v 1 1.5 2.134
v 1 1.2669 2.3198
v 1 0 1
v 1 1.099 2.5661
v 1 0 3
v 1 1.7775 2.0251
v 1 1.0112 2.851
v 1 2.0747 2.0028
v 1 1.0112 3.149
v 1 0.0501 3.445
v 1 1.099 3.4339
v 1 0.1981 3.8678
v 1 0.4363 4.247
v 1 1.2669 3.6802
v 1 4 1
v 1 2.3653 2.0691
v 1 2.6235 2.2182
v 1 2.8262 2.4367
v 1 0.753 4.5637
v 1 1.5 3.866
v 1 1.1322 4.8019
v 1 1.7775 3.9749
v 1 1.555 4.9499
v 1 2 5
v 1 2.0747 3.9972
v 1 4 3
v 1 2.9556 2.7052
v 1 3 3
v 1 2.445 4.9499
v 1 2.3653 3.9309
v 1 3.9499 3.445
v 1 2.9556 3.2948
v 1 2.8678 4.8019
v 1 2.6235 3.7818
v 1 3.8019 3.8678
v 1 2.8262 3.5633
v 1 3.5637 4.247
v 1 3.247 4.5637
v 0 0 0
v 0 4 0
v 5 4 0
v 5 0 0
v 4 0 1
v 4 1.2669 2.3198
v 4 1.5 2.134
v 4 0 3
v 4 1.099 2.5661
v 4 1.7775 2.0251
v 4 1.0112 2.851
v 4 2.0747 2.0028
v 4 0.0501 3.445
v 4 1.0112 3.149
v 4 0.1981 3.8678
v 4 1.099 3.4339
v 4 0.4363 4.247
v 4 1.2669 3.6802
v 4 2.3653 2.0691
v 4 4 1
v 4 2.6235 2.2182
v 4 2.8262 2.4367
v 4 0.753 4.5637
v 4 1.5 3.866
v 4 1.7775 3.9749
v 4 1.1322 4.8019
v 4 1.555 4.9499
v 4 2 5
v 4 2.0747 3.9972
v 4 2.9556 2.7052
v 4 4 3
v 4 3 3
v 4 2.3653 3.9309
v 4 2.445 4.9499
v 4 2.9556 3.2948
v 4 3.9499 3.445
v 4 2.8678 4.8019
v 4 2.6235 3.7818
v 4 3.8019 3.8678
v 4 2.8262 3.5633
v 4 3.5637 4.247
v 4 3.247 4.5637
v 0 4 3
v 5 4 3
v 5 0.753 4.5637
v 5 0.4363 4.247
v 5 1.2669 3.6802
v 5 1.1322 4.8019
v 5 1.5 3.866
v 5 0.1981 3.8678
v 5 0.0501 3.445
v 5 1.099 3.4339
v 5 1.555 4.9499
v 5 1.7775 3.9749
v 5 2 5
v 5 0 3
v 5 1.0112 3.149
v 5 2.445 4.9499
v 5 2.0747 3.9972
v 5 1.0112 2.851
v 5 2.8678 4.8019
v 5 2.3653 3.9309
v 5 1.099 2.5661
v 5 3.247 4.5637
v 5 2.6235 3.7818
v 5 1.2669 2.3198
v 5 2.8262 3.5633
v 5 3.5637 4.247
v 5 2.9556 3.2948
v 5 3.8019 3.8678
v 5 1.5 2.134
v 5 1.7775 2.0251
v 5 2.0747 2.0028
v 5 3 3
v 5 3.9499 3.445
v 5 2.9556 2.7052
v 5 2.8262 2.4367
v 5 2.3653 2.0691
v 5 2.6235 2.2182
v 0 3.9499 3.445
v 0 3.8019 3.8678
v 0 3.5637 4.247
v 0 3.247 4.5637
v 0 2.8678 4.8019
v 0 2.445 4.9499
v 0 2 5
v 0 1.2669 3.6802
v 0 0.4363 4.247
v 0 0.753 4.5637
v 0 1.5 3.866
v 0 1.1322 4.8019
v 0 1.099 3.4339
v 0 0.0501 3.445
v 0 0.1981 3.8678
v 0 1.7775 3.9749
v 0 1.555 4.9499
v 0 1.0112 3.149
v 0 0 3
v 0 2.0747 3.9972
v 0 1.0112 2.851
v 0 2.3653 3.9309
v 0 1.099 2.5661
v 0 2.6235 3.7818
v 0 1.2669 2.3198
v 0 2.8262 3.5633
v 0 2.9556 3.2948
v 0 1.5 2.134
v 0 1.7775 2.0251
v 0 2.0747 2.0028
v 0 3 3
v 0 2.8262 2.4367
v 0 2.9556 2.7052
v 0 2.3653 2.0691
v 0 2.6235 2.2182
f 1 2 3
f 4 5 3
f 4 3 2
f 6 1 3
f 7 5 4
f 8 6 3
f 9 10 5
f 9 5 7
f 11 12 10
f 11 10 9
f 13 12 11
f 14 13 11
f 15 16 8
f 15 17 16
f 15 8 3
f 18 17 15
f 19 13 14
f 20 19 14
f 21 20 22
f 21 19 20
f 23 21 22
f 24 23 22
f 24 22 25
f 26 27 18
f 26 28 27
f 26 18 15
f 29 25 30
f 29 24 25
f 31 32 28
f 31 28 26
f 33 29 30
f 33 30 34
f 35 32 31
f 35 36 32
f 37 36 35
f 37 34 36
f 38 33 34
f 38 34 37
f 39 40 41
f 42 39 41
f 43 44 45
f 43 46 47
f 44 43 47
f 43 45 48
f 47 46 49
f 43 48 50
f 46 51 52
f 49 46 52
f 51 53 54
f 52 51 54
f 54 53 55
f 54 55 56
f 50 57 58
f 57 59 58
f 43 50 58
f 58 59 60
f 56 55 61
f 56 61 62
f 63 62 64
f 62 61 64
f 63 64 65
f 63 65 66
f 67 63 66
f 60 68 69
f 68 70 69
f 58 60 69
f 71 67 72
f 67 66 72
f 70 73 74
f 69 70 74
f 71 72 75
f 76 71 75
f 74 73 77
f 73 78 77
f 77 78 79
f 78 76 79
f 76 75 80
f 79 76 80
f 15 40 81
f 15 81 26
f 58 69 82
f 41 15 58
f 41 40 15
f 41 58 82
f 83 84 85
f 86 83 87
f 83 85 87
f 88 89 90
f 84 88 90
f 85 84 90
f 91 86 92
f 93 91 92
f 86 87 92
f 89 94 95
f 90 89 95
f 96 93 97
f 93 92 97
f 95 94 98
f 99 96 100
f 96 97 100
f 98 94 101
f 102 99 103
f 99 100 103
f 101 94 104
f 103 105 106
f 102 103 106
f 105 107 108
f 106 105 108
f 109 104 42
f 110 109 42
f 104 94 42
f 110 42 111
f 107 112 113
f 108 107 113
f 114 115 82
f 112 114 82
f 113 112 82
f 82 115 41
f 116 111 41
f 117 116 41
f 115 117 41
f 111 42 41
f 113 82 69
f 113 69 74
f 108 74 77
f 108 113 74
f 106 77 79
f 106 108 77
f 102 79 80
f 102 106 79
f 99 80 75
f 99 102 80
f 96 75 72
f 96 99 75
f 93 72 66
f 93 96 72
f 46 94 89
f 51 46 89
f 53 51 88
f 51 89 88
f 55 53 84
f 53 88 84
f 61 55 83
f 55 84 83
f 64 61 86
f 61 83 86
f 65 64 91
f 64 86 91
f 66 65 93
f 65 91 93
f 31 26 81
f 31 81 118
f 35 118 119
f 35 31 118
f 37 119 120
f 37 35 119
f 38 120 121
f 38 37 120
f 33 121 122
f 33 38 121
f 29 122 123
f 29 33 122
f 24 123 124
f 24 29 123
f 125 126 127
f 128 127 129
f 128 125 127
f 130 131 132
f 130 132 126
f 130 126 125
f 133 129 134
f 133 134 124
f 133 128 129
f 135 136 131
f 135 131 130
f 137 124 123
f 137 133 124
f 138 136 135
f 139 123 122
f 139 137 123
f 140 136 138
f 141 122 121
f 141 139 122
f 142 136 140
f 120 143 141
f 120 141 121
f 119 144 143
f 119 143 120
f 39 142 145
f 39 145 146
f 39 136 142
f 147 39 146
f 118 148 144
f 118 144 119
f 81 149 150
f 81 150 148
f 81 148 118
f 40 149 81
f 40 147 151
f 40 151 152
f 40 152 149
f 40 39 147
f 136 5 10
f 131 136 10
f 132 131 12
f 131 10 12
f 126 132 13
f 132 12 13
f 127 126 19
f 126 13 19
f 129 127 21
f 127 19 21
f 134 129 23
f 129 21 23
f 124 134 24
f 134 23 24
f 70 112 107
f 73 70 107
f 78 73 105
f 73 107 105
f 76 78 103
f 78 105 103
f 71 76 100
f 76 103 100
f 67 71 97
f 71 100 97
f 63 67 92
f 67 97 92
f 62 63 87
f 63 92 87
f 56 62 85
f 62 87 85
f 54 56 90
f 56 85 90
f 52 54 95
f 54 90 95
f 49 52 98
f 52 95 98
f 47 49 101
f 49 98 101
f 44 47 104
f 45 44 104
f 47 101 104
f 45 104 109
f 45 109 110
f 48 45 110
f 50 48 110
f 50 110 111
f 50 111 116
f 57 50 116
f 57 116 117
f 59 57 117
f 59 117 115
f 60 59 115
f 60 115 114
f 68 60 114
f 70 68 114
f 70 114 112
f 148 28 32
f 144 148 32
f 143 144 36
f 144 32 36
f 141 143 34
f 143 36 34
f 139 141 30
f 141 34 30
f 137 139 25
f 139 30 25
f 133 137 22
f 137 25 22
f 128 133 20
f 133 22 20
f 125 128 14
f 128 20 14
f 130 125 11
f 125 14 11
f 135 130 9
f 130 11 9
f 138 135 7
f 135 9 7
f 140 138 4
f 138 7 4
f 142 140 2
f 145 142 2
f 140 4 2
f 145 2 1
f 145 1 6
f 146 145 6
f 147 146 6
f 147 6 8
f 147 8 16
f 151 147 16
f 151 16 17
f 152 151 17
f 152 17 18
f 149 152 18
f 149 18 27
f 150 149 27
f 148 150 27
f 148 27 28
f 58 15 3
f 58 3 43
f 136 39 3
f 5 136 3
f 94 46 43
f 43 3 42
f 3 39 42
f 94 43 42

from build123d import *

# Parameters (mm, degrees)
F0_W     = 5
F0_H     = 4
F1_DEPTH = 5
F2_R     = 1.99999
F3_R     = 1
F4_DEPTH = 25
F7_W     = 3
F7_H     = 4
F8_DEPTH = 4


# Not quite as in the source:
# - a fillet or chamfer is up to 0.001 mm smaller than in the source, because OpenCascade refuses the exact size


with BuildPart() as f1:
    # F0 (on Top) → F1 (new body)
    with BuildSketch(Plane.XY):
        with Locations((2.5, 2)):
            Rectangle(F0_W, F0_H)
    extrude(amount=F1_DEPTH)

    # F2 (radius 2 in the source; OpenCascade refuses exactly that, so slightly less here)
    f2_edges = [f1.edges().sort_by_distance(p)[0] for p in [
        (2.5, 0, 5),
        (2.5, 4, 5),
    ]]
    fillet(f2_edges, radius=F2_R)

    # F3 (on face) → F4 (cut)
    with BuildSketch(Plane.YZ.offset(5)):
        with Locations((2, 3)):
            Circle(F3_R)
    extrude(amount=-F4_DEPTH, mode=Mode.SUBTRACT)

    # F7 (on face) → F8 (cut)
    with BuildSketch(Plane.XY.offset(5)):
        with Locations((2.5, 2)):
            Rectangle(F7_W, F7_H)
    extrude(amount=-F8_DEPTH, mode=Mode.SUBTRACT)


solid = f1.part
